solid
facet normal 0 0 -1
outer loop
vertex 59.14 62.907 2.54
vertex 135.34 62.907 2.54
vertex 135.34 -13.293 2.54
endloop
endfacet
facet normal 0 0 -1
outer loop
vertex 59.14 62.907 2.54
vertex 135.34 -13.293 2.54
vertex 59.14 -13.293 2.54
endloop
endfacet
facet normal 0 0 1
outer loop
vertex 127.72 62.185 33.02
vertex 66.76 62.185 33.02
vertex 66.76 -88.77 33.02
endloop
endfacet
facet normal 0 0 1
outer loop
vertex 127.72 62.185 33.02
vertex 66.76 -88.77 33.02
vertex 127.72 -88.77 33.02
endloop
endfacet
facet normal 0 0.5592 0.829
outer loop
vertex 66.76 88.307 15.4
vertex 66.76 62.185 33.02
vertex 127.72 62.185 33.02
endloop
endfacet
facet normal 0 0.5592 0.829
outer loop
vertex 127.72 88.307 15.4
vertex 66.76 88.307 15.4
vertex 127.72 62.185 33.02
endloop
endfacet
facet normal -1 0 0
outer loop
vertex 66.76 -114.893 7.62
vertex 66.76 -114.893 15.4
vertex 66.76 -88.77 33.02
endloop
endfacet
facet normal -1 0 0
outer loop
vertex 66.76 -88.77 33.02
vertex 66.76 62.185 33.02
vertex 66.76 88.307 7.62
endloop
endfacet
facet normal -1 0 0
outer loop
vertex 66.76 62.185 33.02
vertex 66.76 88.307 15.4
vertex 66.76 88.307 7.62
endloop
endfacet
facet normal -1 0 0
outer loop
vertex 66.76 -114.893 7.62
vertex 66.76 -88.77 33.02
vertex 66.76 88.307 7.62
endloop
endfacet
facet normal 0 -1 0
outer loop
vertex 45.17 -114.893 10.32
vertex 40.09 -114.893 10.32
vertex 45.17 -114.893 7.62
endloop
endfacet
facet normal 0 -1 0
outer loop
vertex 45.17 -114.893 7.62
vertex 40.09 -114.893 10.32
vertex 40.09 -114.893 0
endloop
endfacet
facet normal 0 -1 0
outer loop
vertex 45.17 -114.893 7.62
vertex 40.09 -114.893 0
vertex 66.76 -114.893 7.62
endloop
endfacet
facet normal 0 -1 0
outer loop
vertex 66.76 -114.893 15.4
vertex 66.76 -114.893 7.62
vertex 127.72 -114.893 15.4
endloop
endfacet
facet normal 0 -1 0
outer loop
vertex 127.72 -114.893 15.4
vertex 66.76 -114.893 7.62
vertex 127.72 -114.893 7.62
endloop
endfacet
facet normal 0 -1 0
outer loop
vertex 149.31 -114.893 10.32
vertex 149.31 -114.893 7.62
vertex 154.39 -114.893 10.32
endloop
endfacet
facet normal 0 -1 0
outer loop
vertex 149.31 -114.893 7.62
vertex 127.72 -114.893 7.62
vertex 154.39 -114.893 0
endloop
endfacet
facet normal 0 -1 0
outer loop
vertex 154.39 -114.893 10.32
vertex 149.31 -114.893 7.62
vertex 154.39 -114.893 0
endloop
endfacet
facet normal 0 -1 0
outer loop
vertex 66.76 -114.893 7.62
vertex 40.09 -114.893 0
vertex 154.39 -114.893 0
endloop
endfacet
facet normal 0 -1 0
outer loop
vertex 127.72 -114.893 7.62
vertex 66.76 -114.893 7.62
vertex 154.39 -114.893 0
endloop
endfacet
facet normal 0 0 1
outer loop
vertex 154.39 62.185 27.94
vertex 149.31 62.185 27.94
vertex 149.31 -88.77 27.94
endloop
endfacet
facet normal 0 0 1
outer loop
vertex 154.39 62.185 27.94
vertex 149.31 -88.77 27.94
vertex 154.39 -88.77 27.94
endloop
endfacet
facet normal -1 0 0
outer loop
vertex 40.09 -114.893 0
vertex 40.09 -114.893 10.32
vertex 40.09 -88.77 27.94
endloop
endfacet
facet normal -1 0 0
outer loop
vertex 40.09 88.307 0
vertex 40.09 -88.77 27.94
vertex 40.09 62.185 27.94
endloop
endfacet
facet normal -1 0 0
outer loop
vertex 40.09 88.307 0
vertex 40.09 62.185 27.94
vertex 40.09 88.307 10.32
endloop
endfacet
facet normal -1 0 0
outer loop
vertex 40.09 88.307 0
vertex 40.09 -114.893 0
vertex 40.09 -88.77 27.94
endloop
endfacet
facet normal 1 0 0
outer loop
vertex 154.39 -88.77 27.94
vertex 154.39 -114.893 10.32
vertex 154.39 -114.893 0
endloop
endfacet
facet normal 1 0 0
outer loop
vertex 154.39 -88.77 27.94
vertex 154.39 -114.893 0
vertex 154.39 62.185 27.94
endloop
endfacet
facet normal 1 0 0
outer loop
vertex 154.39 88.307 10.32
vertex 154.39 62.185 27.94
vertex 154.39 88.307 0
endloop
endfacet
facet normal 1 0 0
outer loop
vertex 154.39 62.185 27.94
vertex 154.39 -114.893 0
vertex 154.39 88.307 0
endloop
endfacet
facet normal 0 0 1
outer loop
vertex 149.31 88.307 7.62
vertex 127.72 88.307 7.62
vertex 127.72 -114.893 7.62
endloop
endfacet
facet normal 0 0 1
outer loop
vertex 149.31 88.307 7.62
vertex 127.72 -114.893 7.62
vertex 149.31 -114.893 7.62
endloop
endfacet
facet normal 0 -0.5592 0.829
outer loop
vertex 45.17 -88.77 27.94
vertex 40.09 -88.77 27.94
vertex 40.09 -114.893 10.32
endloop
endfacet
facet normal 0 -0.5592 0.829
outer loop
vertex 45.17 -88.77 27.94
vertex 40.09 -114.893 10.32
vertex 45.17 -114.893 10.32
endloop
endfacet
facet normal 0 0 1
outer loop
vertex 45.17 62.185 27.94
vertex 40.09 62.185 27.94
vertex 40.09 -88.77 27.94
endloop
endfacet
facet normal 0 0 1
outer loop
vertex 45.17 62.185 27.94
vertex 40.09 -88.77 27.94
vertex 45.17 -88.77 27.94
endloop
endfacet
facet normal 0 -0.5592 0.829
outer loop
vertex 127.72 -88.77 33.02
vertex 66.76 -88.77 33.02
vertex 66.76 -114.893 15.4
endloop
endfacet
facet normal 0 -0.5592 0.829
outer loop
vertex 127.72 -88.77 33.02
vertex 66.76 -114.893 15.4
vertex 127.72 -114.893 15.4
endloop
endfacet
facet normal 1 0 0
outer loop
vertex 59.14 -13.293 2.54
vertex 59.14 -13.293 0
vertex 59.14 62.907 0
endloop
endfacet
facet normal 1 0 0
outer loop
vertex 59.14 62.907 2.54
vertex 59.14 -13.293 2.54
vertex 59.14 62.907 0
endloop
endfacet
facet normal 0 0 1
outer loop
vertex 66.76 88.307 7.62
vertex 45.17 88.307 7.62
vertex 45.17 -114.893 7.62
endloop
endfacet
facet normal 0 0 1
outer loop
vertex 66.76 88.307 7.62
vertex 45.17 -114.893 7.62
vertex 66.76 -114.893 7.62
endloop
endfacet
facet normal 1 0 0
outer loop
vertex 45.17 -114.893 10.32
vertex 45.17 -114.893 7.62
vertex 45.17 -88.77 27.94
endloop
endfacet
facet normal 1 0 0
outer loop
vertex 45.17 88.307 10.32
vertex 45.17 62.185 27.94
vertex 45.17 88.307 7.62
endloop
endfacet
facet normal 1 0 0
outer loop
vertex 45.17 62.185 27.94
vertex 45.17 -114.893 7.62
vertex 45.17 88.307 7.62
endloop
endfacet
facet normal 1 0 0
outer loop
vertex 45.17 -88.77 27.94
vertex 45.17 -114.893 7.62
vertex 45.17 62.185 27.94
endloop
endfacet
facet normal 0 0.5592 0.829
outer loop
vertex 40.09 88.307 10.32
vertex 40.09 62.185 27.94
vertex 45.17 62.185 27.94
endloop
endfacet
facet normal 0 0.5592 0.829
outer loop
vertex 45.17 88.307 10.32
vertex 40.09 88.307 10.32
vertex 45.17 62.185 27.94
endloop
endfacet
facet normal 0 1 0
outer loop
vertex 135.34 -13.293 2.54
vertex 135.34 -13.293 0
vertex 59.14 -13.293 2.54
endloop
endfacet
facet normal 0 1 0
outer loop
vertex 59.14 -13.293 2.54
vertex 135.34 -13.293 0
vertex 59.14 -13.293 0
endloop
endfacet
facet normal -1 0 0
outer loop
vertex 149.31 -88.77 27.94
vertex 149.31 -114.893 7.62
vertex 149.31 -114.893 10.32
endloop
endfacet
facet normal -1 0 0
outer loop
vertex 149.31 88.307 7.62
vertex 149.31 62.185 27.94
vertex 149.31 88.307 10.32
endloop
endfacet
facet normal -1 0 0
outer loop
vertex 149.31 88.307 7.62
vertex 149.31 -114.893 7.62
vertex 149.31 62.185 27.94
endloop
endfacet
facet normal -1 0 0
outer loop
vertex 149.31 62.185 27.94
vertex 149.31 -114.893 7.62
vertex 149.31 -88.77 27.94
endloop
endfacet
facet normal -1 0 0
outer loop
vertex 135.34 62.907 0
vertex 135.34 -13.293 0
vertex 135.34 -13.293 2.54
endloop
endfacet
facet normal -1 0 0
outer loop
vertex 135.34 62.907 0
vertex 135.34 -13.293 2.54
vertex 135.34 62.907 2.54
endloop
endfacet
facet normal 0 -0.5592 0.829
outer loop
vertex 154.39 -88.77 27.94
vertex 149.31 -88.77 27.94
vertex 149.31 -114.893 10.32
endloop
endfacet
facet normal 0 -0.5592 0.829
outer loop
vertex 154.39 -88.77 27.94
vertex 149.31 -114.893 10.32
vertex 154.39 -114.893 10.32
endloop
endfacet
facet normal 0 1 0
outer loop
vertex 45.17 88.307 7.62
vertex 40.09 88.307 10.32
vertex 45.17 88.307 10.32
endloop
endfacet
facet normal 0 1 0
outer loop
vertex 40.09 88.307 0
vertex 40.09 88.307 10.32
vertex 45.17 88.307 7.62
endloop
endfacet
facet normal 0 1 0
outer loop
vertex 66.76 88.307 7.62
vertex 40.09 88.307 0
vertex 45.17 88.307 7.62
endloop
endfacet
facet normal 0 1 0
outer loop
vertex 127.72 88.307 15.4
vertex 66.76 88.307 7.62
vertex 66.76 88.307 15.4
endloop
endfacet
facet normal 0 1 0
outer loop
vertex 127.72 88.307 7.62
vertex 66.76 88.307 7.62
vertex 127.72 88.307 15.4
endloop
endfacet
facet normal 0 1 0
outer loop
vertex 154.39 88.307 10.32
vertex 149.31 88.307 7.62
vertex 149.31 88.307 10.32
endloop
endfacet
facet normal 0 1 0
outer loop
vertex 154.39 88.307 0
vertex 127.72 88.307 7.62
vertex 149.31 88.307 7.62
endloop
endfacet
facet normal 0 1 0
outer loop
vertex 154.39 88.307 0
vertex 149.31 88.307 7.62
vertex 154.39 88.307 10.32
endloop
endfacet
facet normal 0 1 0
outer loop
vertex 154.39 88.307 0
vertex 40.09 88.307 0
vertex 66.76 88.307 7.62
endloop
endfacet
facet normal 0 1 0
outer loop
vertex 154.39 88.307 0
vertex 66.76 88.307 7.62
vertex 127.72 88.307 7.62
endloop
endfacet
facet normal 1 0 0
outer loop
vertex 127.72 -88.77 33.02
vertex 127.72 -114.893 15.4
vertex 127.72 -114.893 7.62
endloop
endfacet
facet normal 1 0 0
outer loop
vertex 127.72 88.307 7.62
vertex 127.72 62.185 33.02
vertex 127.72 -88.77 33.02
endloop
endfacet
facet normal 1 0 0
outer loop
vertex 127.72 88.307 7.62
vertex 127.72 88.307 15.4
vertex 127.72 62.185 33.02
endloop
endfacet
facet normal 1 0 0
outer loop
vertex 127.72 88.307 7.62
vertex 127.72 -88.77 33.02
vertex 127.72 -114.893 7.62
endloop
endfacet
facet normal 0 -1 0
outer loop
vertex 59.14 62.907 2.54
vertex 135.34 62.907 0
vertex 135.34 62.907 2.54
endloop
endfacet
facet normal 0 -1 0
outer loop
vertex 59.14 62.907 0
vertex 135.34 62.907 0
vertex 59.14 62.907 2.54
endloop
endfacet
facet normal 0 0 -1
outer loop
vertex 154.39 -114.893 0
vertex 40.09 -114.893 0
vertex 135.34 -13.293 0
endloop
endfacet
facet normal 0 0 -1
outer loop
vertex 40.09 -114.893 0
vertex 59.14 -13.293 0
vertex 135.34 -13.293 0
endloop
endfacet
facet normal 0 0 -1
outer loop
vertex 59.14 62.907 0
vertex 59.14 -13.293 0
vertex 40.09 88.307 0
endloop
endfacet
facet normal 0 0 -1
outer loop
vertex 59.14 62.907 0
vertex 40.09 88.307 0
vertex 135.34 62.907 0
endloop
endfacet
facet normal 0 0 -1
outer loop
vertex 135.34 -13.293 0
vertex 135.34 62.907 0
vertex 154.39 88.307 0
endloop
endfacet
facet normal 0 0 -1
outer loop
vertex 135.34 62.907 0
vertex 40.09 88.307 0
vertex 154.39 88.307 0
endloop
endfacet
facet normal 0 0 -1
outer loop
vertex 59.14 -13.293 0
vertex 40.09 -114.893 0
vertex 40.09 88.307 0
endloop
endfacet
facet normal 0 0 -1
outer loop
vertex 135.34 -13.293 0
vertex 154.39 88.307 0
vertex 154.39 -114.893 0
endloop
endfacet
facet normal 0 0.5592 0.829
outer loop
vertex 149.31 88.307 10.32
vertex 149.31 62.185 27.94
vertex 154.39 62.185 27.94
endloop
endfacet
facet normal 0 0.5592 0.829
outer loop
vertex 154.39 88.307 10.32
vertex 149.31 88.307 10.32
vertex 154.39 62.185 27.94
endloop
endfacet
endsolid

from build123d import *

# Parameters (mm, degrees)
SKETCH1_W             = 114.3
SKETCH1_H             = 203.2
BOSS_EXTRUDE1_DEPTH   = 33.02
SKETCH2_W             = 26.67
SKETCH2_H             = 25.4
CUT_EXTRUDE1_DEPTH    = 204.2
CHAMFER1_SIZE         = 17.62
CHAMFER1_SIZE2        = 26.122724265
CHAMFER1_PART_2_SIZE  = 17.62
CHAMFER1_PART_2_SIZE2 = 26.122724265
SKETCH3_W             = 5.08
SKETCH3_H             = 203.2
BOSS_EXTRUDE2_DEPTH   = 20.32
CHAMFER2_SIZE         = 17.62
CHAMFER2_SIZE2        = 26.122724265
CHAMFER2_PART_2_SIZE  = 17.62
CHAMFER2_PART_2_SIZE2 = 26.122724265
SKETCH5_W             = 76.2
SKETCH5_H             = 76.2
CUT_EXTRUDE2_DEPTH    = 2.54


with BuildPart() as part:
    # Sketch1 → Boss-Extrude1 (new body)
    with BuildSketch(Plane.XY):
        with Locations((97.239666667, -13.292666667)):
            Rectangle(SKETCH1_W, SKETCH1_H)
    extrude(amount=BOSS_EXTRUDE1_DEPTH)

    # Sketch2 → Cut-Extrude1 (cut, through all)
    with BuildSketch(Plane(origin=(0, 88.307333333, 0), x_dir=(1, 0, 0), z_dir=(0, 1, 0))):
        with Locations((53.424666667, -20.32)):
            Rectangle(SKETCH2_W, SKETCH2_H)
        with Locations((141.054666667, -20.32)):
            Rectangle(SKETCH2_W, SKETCH2_H)
    extrude(amount=-CUT_EXTRUDE1_DEPTH, mode=Mode.SUBTRACT)

    # Chamfer1
    chamfer1_edges = [part.edges().sort_by_distance(p)[0] for p in [
        (97.239666667, -114.892666667, 33.02),
    ]]
    chamfer1_side = [part.faces().sort_by_distance(p)[0] for p in [
        (97.239666667, -114.892666667, 14.3764),
    ]]
    chamfer(chamfer1_edges, length=CHAMFER1_SIZE, length2=CHAMFER1_SIZE2, reference=chamfer1_side[0])

    # Chamfer1 part 2
    chamfer1_part_2_edges = [part.edges().sort_by_distance(p)[0] for p in [
        (97.239666667, 88.307333333, 33.02),
    ]]
    chamfer1_part_2_side = [part.faces().sort_by_distance(p)[0] for p in [
        (97.239666667, 88.307333333, 14.3764),
    ]]
    chamfer(chamfer1_part_2_edges, length=CHAMFER1_PART_2_SIZE, length2=CHAMFER1_PART_2_SIZE2, reference=chamfer1_part_2_side[0])

    # Sketch3 → Boss-Extrude2 (add)
    with BuildSketch(Plane.XY.offset(7.62)):
        with Locations((42.629666667, -13.292666667)):
            Rectangle(SKETCH3_W, SKETCH3_H)
        with Locations((151.849666667, -13.292666667)):
            Rectangle(SKETCH3_W, SKETCH3_H)
    extrude(amount=BOSS_EXTRUDE2_DEPTH)

    # Chamfer2
    chamfer2_edges = [part.edges().sort_by_distance(p)[0] for p in [
        (42.629666667, -114.892666667, 27.94),
        (151.849666667, -114.892666667, 27.94),
    ]]
    chamfer2_side = [part.faces().sort_by_distance(p)[0] for p in [
        (97.239666667, -114.892666667, 8.022187919),
    ]]
    chamfer(chamfer2_edges, length=CHAMFER2_SIZE, length2=CHAMFER2_SIZE2, reference=chamfer2_side[0])

    # Chamfer2 part 2
    chamfer2_part_2_edges = [part.edges().sort_by_distance(p)[0] for p in [
        (42.629666667, 88.307333333, 27.94),
        (151.849666667, 88.307333333, 27.94),
    ]]
    chamfer2_part_2_side = [part.faces().sort_by_distance(p)[0] for p in [
        (97.239666667, 88.307333333, 8.022187919),
    ]]
    chamfer(chamfer2_part_2_edges, length=CHAMFER2_PART_2_SIZE, length2=CHAMFER2_PART_2_SIZE2, reference=chamfer2_part_2_side[0])

    # Sketch5 → Cut-Extrude2 (cut)
    with BuildSketch(Plane(origin=(0, 0, 0), x_dir=(-1, 0, 0), z_dir=(0, 0, -1))):
        with Locations((-97.239666667, 24.807333333)):
            Rectangle(SKETCH5_W, SKETCH5_H)
    extrude(amount=-CUT_EXTRUDE2_DEPTH, mode=Mode.SUBTRACT)


solid = part.part
